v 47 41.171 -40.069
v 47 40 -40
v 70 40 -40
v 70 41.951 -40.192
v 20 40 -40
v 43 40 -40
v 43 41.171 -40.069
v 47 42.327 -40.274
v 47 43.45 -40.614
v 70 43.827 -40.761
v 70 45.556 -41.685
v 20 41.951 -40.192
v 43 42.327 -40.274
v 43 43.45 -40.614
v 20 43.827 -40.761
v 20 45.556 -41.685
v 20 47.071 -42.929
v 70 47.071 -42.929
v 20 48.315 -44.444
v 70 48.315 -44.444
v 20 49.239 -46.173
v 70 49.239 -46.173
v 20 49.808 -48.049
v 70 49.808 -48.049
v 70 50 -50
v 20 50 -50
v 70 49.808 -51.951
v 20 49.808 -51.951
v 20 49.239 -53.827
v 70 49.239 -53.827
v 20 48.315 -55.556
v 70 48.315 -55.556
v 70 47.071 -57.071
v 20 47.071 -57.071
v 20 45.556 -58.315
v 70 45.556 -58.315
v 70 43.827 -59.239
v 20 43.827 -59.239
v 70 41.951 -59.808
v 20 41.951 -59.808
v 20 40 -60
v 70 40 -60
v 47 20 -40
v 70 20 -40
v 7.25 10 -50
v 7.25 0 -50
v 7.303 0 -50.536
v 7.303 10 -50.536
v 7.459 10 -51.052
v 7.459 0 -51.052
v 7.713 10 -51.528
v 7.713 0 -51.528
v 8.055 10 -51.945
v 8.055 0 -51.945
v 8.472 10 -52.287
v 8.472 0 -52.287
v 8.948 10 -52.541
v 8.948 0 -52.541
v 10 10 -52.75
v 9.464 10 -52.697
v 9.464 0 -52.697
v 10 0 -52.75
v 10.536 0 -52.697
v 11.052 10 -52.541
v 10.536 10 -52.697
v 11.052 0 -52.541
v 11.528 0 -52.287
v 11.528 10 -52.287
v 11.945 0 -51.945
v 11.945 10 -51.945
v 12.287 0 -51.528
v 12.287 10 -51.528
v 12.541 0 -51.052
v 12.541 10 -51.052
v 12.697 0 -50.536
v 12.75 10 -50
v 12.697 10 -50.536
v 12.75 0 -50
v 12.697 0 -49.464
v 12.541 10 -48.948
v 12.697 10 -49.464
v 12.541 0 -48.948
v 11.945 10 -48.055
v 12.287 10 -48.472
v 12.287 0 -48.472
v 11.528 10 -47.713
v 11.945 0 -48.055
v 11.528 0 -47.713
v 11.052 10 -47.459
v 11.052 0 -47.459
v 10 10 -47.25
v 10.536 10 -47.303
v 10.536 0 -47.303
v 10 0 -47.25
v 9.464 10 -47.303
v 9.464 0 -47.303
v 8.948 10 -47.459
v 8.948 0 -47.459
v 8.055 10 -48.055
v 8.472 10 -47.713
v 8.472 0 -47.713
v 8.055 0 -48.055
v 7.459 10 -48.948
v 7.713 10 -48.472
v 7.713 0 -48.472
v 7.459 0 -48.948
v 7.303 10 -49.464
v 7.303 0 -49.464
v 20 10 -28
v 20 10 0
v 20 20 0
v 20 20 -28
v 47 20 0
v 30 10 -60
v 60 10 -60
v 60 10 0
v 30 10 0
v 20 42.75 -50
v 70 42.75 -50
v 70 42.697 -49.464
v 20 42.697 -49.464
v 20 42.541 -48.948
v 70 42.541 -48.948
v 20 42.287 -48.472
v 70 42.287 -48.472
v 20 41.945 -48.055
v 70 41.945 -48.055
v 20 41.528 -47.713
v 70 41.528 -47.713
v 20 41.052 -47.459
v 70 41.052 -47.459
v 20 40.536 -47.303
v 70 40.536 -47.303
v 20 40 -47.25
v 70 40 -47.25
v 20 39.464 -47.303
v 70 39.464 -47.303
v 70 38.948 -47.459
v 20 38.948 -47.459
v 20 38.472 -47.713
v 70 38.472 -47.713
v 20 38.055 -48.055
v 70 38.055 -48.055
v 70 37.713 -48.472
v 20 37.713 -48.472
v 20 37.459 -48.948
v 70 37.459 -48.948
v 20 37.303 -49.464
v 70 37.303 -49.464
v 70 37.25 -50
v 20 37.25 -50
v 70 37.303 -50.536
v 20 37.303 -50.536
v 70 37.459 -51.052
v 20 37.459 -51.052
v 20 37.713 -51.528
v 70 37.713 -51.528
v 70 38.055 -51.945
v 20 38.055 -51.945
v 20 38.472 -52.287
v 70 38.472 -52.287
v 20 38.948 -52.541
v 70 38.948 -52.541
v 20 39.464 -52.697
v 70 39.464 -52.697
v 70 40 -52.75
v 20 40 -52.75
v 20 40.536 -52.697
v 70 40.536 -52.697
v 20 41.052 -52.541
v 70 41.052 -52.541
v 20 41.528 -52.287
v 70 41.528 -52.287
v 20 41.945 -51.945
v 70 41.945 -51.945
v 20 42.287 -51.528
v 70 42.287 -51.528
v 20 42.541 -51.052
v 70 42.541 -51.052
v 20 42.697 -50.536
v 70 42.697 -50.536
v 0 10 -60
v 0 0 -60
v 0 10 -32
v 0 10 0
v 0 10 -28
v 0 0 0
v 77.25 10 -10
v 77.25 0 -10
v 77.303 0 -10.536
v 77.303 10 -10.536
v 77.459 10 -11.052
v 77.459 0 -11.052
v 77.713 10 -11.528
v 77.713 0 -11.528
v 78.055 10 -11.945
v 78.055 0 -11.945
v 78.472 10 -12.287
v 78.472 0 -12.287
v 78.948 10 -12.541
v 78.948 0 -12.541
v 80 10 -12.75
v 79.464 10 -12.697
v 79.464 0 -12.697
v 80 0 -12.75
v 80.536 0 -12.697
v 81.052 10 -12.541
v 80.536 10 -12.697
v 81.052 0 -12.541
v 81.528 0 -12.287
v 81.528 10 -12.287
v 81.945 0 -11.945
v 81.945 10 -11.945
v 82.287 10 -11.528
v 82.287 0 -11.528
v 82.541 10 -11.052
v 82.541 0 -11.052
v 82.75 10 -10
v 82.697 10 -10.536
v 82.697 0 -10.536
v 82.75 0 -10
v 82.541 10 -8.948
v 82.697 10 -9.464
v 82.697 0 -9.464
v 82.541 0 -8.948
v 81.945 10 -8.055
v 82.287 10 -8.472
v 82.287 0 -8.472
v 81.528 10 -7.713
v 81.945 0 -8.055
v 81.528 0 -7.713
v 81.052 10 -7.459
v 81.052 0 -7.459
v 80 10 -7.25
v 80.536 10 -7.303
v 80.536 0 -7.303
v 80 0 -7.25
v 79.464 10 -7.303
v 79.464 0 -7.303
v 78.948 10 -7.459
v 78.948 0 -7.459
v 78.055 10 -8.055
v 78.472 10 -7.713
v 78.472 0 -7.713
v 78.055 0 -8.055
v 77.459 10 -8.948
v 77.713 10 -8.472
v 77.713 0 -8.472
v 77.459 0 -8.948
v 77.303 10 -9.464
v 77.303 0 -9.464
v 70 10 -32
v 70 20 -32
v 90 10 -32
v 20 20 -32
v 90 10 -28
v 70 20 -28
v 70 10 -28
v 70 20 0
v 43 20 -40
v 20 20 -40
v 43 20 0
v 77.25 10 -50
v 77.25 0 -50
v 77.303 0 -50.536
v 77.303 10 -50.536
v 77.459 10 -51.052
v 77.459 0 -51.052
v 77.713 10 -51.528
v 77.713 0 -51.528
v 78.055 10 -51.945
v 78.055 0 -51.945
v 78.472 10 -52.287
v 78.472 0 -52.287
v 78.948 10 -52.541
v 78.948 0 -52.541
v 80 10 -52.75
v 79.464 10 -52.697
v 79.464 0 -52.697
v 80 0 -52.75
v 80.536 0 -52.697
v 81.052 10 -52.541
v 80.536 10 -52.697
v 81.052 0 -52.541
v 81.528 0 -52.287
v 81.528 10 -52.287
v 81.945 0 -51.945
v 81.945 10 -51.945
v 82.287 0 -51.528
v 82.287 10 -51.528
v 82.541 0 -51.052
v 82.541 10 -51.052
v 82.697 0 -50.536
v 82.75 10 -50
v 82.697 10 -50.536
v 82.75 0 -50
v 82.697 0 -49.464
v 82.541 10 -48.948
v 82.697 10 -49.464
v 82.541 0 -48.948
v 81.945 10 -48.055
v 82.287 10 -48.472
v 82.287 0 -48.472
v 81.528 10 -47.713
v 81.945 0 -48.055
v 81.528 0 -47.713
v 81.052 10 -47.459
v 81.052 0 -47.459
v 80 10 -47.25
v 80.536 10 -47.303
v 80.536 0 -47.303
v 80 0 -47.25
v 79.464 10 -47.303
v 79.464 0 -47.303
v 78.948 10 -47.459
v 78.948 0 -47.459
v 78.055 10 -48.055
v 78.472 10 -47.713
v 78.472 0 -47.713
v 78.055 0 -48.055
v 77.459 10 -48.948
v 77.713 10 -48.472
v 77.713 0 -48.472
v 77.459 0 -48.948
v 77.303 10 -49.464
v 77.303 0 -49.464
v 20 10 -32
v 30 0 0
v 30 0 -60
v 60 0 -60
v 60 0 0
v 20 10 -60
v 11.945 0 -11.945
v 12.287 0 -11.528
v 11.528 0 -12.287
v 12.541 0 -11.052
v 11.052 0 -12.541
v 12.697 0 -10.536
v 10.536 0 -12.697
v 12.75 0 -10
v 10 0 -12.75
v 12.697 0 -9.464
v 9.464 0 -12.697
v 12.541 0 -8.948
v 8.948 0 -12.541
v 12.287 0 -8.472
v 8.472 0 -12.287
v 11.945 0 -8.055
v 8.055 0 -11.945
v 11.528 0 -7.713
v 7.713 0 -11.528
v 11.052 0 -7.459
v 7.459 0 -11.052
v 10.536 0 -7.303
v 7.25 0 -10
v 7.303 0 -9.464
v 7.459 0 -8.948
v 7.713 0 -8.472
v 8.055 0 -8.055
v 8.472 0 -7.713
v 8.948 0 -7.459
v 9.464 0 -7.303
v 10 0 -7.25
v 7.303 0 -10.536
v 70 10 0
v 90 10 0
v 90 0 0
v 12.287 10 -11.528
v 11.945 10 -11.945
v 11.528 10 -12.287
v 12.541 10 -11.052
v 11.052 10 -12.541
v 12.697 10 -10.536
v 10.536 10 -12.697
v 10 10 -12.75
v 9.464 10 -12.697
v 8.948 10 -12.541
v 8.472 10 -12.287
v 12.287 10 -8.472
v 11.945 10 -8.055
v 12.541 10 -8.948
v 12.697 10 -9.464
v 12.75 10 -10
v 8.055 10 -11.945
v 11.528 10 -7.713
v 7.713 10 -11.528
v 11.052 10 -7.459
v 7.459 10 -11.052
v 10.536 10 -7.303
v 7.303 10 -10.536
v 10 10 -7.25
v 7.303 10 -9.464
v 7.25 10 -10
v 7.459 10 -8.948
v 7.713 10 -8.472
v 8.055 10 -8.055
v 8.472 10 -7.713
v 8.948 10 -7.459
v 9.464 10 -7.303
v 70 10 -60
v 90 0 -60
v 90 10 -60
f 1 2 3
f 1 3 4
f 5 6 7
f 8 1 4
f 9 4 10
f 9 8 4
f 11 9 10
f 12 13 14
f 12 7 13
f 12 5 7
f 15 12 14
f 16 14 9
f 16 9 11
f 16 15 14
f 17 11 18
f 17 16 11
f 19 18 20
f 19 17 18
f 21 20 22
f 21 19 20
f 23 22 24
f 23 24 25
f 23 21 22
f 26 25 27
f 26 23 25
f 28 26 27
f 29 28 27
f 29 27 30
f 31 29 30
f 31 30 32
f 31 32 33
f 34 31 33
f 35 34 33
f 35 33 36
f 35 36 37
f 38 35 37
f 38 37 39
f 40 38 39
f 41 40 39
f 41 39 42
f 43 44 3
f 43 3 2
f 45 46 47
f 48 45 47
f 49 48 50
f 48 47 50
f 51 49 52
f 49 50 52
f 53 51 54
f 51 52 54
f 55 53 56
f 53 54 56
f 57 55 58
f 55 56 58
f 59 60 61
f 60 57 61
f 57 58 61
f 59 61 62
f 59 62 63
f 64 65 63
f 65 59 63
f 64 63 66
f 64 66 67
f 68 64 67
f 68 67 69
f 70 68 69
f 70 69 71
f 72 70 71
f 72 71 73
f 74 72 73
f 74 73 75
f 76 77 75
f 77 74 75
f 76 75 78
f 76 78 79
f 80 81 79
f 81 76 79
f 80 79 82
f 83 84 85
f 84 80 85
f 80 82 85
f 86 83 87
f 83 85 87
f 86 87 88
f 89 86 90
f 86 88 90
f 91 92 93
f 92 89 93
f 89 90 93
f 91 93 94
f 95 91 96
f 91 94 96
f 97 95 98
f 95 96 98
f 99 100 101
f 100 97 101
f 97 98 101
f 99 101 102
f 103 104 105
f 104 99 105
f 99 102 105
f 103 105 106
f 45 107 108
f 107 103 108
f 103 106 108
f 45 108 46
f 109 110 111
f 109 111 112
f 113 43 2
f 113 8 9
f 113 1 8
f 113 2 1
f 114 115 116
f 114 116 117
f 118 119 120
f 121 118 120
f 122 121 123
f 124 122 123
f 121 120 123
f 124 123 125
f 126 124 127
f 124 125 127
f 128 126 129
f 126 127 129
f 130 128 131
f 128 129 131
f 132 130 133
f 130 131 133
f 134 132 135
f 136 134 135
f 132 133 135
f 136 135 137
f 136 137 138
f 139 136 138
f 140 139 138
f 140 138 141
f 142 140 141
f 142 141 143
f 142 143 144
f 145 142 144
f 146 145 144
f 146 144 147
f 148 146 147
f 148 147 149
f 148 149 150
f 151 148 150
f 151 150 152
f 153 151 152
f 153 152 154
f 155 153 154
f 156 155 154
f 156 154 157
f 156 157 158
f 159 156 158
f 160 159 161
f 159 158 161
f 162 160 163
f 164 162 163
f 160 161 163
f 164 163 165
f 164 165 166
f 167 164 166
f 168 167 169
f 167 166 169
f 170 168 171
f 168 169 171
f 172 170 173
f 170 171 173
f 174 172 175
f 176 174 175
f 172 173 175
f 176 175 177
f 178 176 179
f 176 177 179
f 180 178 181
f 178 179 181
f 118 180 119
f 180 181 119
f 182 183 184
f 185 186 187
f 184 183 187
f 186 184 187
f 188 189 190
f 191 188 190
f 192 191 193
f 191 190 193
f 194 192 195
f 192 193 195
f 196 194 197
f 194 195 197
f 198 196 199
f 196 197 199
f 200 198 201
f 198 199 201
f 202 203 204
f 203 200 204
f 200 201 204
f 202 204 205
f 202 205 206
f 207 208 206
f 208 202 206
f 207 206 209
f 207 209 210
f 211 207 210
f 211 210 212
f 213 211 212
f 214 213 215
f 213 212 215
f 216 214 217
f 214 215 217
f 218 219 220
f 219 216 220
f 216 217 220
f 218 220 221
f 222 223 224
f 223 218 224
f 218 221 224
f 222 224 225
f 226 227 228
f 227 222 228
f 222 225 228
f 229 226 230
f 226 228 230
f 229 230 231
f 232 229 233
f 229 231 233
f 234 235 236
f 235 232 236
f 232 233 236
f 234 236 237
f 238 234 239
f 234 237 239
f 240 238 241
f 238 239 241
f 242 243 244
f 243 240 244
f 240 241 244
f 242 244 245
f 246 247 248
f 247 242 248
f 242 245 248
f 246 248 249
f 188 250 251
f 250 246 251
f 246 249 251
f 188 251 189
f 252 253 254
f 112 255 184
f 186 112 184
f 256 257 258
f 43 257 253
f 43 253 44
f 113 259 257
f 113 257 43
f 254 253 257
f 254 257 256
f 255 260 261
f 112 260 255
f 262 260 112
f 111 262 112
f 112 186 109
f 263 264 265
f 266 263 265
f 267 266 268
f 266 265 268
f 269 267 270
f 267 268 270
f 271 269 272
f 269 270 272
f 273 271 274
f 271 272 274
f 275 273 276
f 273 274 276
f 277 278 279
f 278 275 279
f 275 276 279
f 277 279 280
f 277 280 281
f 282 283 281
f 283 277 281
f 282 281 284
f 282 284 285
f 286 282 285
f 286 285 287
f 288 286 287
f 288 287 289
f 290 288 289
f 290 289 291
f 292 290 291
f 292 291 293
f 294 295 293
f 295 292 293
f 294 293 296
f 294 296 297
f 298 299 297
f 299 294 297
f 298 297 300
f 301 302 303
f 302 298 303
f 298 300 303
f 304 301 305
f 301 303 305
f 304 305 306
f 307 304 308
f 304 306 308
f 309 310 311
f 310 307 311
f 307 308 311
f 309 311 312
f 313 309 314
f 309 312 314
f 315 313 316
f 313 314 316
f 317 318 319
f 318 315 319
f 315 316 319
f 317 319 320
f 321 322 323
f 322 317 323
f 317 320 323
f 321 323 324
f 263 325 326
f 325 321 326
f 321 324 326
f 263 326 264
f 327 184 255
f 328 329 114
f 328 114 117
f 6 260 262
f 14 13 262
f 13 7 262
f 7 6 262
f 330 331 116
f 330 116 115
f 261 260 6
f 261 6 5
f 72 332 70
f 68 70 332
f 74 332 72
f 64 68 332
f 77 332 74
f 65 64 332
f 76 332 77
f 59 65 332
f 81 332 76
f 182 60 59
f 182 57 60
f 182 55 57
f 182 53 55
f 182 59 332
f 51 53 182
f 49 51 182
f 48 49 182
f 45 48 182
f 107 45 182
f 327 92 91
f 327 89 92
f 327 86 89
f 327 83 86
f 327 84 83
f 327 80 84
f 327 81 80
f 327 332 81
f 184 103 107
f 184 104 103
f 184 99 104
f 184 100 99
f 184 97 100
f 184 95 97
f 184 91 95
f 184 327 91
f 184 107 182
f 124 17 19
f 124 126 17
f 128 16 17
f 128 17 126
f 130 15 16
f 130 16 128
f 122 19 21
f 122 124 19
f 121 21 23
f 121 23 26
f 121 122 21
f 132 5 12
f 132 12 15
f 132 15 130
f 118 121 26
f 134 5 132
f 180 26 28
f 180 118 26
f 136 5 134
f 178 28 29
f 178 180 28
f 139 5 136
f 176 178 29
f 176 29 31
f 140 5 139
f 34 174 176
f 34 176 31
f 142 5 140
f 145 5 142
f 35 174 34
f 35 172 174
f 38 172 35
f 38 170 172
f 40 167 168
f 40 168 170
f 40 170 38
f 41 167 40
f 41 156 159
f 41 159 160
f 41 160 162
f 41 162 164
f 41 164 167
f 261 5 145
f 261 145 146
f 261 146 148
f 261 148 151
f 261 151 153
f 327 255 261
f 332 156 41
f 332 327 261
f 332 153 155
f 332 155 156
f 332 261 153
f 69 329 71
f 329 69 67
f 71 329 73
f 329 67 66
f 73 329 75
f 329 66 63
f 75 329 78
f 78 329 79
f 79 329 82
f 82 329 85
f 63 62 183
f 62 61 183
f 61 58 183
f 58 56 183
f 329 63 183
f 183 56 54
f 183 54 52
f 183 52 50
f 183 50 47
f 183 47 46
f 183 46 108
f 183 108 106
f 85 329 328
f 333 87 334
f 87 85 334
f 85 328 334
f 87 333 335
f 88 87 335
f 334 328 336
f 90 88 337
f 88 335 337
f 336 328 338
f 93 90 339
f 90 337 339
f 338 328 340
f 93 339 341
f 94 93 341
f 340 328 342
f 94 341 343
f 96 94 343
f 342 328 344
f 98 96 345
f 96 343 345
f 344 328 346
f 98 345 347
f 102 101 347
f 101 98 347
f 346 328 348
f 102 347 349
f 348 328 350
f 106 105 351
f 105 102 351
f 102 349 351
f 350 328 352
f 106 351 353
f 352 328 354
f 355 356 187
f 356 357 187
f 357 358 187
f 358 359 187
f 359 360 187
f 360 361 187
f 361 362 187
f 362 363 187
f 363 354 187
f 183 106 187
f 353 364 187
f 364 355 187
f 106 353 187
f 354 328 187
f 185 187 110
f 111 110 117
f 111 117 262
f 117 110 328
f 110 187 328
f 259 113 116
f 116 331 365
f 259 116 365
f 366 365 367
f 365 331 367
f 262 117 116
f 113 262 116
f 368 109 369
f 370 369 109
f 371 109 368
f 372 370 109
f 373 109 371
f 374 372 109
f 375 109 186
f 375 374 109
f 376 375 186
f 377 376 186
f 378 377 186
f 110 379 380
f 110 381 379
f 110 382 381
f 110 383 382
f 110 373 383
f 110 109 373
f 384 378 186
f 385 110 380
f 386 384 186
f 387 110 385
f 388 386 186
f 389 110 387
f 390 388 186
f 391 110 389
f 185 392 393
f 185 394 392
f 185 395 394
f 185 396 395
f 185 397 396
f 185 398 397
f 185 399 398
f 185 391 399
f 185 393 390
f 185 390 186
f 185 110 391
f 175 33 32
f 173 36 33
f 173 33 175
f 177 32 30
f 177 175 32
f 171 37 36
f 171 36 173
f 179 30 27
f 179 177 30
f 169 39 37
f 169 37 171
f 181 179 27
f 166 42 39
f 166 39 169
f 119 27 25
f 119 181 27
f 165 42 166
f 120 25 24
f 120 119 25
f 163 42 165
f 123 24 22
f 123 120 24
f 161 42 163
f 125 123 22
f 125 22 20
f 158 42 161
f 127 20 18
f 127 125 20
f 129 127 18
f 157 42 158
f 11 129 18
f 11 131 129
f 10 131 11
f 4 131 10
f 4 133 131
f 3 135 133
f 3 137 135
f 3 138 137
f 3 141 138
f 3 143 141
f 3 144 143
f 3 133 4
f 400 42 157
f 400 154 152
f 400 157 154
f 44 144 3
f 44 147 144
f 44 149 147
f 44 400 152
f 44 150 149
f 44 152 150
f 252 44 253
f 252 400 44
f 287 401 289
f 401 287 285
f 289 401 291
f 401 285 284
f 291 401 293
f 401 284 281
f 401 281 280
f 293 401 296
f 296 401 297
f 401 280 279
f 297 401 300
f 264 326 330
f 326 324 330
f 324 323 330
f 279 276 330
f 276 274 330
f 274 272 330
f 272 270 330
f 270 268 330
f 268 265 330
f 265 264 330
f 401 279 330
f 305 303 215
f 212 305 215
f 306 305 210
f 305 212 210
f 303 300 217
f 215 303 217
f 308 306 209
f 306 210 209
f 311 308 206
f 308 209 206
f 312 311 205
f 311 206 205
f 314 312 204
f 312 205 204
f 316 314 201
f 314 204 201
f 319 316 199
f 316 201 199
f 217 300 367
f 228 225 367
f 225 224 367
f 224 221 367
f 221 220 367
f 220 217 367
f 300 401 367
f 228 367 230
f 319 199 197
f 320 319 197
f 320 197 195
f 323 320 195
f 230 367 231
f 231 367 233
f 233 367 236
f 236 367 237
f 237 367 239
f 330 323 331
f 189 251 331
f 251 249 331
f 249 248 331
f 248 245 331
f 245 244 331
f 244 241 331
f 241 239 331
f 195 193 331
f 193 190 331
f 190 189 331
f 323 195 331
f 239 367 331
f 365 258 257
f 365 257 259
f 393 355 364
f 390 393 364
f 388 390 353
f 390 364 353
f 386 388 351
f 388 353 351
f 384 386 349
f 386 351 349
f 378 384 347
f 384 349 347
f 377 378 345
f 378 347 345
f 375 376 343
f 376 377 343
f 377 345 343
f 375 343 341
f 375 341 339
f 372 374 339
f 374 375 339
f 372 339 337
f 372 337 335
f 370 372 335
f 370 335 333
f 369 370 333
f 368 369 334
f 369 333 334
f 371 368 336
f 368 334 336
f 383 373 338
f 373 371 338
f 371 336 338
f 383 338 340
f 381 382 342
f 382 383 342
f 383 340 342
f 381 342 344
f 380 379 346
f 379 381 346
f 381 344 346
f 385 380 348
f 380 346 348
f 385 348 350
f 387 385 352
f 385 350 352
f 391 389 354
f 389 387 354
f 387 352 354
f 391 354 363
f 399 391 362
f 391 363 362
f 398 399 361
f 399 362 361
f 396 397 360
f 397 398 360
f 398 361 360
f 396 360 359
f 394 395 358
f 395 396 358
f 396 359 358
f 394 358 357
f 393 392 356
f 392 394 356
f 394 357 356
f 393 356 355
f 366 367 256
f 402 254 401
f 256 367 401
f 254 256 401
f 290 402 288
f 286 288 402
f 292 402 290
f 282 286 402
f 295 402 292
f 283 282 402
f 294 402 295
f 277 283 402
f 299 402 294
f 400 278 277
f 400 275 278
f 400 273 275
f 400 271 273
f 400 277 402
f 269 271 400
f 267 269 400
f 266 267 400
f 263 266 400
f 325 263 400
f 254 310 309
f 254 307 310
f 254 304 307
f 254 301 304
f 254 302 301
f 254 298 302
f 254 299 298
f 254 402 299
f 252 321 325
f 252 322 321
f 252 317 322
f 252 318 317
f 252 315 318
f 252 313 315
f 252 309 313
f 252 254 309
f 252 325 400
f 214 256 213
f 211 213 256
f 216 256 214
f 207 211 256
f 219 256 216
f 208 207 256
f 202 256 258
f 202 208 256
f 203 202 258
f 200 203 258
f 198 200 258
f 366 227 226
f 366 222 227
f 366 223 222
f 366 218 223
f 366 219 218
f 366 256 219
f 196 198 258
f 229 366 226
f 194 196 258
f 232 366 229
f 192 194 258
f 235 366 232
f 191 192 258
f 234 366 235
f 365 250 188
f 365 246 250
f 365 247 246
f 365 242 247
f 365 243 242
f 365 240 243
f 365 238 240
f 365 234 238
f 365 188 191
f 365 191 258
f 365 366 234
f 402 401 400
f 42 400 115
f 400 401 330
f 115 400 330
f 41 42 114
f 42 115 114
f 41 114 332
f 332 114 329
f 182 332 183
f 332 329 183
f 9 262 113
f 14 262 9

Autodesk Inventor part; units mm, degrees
ref_plane "XZ Plane" through (0, 0, 0) normal (0, 1, 0) x (-1, 0, 0)
sketch "Sketch1" plane through (0, 0, 0) normal (0, 1, 0) x (-1, 0, 0)
  line L0 (0, 0) -> (-90, 0)
  line L1 (-90, 0) -> (-90, -60)
  line L2 (-90, -60) -> (0, -60)
  line L3 (0, -60) -> (0, 0)
  line L4 (-30, 0) -> (-60, 0)
  line L5 (-60, 0) -> (-60, -60)
  line L6 (-60, -60) -> (-30, -60)
  line L7 (-30, -60) -> (-30, 0)
  line L8 (-20, -60) -> (-70, -60)
  line L9 (-70, -60) -> (-70, 0)
  line L10 (-70, 0) -> (-20, 0)
  line L11 (-20, 0) -> (-20, -60)
  line L12 (-20, -60) -> (-70, -60)
  line L13 (-70, -60) -> (-70, -40)
  line L14 (-70, -40) -> (-20, -40)
  line L15 (-20, -40) -> (-20, -60)
  circle A0 centre (-10, -50) radius 2.75
  circle A1 centre (-10, -10) radius 2.75
  circle A2 centre (-80, -50) radius 2.75
  circle A3 centre (-80, -10) radius 2.75
  point P0 (0, -30)
  point P1 (-60, -40)
  point P2 (-30, -40)
  point P3 (-70, 0)
  point P4 (-20, 0)
  dimension "d0" = 90
  dimension "d1" = 60
  dimension "d2" = 30
  dimension "d3" = 30
  dimension "d4" = 50
  dimension "d5" = 60
  dimension "d6" = 20
  dimension "d7" = 20
  dimension "d8" = 5.5
  dimension "d9" = 5.5
  dimension "d10" = 5.5
  dimension "d11" = 5.5
  dimension "d12" = 10
  dimension "d13" = 10
  dimension "d14" = 10
  dimension "d15" = 10
  dimension "d16" = 10
  dimension "d17" = 10
  dimension "d18" = 10
  dimension "d19" = 10
extrude "Extrusion1" add sketch "Sketch1" along normal blind 10 contours L3 L2 L11 L0 | L9 L2 L1 L0
extrude "Extrusion2" add sketch "Sketch1" along normal blind 20 contours L11 L14 L7 L0 | L7 L14 L5 L0 | L11 L2 L7 L14 | L5 L14 L9 L0 | L5 L2 L9 L14
extrude "Extrusion3" add sketch "Sketch1" along normal blind 50 contours L11 L2 L7 L14 | L7 L2 L5 L14 | L5 L2 L9 L14
extrude "Extrusion4" cut sketch "Sketch1" along normal blind 10 contours L7 L14 L5 L0 | L7 L2 L5 L14
ref_plane "Work Plane2" through (0, 0, -30) normal (0, 0, 1) x (1, 0, 0)
ref_plane "Work Plane3" through (45, 0, 0) normal (1, 0, 0) x (0, 1, 0)
sketch "Sketch7" plane through (0, 0, -30) normal (0, 0, 1) x (1, 0, 0)
  line L0 (20, 10) -> (20, 20) projected
  line L1 (20, 10) -> (0, 10) projected
  line L2 (20, 20) -> (0, 10)
  line L3 (0, 10) -> (20, 10)
  line L4 (20, 10) -> (20, 20)
  line L5 (70, 20) -> (60, 20) projected
  line L6 (70, 20) -> (90, 10)
  line L7 (90, 10) -> (70, 10) projected
  line L8 (90, 10) -> (70, 10)
  line L9 (70, 10) -> (70, 20)
  point P0 (0, 0)
extrude "Extrusion9" add sketch "Sketch7" along normal mid plane 4
sketch "Sketch8" plane through (45, 0, 0) normal (1, 0, 0) x (0, 1, 0)
  circle A0 centre (40, -50) radius 2.75
  line L0 (20, 0) -> (50, -51.9582)
  line L1 (20, 0) -> (20, -51.9582)
  line L2 (20, -51.9582) -> (50, -51.9582)
  point P0 (0, 0)
  point P1 (38.0692, -51.9582)
  point P2 (41.9308, -51.9582)
  dimension "d45" = 40
  dimension "d49" = 50
  dimension "d50" = 20
  dimension "d55" = 5.5
extrude "Extrusion10" add sketch "Sketch8" along normal mid plane 4 contours A0 L2 L1 L0
extrude "Extrusion11" cut sketch "Sketch8" along normal through all both and the other way through all contours A0 L2 | L2 A0
fillet "Fillet1" radius 10 2 edges at (45, 50, -40) (45, 50, -60)
properties part number "Homework 1d" material "Aluminum 6061"
